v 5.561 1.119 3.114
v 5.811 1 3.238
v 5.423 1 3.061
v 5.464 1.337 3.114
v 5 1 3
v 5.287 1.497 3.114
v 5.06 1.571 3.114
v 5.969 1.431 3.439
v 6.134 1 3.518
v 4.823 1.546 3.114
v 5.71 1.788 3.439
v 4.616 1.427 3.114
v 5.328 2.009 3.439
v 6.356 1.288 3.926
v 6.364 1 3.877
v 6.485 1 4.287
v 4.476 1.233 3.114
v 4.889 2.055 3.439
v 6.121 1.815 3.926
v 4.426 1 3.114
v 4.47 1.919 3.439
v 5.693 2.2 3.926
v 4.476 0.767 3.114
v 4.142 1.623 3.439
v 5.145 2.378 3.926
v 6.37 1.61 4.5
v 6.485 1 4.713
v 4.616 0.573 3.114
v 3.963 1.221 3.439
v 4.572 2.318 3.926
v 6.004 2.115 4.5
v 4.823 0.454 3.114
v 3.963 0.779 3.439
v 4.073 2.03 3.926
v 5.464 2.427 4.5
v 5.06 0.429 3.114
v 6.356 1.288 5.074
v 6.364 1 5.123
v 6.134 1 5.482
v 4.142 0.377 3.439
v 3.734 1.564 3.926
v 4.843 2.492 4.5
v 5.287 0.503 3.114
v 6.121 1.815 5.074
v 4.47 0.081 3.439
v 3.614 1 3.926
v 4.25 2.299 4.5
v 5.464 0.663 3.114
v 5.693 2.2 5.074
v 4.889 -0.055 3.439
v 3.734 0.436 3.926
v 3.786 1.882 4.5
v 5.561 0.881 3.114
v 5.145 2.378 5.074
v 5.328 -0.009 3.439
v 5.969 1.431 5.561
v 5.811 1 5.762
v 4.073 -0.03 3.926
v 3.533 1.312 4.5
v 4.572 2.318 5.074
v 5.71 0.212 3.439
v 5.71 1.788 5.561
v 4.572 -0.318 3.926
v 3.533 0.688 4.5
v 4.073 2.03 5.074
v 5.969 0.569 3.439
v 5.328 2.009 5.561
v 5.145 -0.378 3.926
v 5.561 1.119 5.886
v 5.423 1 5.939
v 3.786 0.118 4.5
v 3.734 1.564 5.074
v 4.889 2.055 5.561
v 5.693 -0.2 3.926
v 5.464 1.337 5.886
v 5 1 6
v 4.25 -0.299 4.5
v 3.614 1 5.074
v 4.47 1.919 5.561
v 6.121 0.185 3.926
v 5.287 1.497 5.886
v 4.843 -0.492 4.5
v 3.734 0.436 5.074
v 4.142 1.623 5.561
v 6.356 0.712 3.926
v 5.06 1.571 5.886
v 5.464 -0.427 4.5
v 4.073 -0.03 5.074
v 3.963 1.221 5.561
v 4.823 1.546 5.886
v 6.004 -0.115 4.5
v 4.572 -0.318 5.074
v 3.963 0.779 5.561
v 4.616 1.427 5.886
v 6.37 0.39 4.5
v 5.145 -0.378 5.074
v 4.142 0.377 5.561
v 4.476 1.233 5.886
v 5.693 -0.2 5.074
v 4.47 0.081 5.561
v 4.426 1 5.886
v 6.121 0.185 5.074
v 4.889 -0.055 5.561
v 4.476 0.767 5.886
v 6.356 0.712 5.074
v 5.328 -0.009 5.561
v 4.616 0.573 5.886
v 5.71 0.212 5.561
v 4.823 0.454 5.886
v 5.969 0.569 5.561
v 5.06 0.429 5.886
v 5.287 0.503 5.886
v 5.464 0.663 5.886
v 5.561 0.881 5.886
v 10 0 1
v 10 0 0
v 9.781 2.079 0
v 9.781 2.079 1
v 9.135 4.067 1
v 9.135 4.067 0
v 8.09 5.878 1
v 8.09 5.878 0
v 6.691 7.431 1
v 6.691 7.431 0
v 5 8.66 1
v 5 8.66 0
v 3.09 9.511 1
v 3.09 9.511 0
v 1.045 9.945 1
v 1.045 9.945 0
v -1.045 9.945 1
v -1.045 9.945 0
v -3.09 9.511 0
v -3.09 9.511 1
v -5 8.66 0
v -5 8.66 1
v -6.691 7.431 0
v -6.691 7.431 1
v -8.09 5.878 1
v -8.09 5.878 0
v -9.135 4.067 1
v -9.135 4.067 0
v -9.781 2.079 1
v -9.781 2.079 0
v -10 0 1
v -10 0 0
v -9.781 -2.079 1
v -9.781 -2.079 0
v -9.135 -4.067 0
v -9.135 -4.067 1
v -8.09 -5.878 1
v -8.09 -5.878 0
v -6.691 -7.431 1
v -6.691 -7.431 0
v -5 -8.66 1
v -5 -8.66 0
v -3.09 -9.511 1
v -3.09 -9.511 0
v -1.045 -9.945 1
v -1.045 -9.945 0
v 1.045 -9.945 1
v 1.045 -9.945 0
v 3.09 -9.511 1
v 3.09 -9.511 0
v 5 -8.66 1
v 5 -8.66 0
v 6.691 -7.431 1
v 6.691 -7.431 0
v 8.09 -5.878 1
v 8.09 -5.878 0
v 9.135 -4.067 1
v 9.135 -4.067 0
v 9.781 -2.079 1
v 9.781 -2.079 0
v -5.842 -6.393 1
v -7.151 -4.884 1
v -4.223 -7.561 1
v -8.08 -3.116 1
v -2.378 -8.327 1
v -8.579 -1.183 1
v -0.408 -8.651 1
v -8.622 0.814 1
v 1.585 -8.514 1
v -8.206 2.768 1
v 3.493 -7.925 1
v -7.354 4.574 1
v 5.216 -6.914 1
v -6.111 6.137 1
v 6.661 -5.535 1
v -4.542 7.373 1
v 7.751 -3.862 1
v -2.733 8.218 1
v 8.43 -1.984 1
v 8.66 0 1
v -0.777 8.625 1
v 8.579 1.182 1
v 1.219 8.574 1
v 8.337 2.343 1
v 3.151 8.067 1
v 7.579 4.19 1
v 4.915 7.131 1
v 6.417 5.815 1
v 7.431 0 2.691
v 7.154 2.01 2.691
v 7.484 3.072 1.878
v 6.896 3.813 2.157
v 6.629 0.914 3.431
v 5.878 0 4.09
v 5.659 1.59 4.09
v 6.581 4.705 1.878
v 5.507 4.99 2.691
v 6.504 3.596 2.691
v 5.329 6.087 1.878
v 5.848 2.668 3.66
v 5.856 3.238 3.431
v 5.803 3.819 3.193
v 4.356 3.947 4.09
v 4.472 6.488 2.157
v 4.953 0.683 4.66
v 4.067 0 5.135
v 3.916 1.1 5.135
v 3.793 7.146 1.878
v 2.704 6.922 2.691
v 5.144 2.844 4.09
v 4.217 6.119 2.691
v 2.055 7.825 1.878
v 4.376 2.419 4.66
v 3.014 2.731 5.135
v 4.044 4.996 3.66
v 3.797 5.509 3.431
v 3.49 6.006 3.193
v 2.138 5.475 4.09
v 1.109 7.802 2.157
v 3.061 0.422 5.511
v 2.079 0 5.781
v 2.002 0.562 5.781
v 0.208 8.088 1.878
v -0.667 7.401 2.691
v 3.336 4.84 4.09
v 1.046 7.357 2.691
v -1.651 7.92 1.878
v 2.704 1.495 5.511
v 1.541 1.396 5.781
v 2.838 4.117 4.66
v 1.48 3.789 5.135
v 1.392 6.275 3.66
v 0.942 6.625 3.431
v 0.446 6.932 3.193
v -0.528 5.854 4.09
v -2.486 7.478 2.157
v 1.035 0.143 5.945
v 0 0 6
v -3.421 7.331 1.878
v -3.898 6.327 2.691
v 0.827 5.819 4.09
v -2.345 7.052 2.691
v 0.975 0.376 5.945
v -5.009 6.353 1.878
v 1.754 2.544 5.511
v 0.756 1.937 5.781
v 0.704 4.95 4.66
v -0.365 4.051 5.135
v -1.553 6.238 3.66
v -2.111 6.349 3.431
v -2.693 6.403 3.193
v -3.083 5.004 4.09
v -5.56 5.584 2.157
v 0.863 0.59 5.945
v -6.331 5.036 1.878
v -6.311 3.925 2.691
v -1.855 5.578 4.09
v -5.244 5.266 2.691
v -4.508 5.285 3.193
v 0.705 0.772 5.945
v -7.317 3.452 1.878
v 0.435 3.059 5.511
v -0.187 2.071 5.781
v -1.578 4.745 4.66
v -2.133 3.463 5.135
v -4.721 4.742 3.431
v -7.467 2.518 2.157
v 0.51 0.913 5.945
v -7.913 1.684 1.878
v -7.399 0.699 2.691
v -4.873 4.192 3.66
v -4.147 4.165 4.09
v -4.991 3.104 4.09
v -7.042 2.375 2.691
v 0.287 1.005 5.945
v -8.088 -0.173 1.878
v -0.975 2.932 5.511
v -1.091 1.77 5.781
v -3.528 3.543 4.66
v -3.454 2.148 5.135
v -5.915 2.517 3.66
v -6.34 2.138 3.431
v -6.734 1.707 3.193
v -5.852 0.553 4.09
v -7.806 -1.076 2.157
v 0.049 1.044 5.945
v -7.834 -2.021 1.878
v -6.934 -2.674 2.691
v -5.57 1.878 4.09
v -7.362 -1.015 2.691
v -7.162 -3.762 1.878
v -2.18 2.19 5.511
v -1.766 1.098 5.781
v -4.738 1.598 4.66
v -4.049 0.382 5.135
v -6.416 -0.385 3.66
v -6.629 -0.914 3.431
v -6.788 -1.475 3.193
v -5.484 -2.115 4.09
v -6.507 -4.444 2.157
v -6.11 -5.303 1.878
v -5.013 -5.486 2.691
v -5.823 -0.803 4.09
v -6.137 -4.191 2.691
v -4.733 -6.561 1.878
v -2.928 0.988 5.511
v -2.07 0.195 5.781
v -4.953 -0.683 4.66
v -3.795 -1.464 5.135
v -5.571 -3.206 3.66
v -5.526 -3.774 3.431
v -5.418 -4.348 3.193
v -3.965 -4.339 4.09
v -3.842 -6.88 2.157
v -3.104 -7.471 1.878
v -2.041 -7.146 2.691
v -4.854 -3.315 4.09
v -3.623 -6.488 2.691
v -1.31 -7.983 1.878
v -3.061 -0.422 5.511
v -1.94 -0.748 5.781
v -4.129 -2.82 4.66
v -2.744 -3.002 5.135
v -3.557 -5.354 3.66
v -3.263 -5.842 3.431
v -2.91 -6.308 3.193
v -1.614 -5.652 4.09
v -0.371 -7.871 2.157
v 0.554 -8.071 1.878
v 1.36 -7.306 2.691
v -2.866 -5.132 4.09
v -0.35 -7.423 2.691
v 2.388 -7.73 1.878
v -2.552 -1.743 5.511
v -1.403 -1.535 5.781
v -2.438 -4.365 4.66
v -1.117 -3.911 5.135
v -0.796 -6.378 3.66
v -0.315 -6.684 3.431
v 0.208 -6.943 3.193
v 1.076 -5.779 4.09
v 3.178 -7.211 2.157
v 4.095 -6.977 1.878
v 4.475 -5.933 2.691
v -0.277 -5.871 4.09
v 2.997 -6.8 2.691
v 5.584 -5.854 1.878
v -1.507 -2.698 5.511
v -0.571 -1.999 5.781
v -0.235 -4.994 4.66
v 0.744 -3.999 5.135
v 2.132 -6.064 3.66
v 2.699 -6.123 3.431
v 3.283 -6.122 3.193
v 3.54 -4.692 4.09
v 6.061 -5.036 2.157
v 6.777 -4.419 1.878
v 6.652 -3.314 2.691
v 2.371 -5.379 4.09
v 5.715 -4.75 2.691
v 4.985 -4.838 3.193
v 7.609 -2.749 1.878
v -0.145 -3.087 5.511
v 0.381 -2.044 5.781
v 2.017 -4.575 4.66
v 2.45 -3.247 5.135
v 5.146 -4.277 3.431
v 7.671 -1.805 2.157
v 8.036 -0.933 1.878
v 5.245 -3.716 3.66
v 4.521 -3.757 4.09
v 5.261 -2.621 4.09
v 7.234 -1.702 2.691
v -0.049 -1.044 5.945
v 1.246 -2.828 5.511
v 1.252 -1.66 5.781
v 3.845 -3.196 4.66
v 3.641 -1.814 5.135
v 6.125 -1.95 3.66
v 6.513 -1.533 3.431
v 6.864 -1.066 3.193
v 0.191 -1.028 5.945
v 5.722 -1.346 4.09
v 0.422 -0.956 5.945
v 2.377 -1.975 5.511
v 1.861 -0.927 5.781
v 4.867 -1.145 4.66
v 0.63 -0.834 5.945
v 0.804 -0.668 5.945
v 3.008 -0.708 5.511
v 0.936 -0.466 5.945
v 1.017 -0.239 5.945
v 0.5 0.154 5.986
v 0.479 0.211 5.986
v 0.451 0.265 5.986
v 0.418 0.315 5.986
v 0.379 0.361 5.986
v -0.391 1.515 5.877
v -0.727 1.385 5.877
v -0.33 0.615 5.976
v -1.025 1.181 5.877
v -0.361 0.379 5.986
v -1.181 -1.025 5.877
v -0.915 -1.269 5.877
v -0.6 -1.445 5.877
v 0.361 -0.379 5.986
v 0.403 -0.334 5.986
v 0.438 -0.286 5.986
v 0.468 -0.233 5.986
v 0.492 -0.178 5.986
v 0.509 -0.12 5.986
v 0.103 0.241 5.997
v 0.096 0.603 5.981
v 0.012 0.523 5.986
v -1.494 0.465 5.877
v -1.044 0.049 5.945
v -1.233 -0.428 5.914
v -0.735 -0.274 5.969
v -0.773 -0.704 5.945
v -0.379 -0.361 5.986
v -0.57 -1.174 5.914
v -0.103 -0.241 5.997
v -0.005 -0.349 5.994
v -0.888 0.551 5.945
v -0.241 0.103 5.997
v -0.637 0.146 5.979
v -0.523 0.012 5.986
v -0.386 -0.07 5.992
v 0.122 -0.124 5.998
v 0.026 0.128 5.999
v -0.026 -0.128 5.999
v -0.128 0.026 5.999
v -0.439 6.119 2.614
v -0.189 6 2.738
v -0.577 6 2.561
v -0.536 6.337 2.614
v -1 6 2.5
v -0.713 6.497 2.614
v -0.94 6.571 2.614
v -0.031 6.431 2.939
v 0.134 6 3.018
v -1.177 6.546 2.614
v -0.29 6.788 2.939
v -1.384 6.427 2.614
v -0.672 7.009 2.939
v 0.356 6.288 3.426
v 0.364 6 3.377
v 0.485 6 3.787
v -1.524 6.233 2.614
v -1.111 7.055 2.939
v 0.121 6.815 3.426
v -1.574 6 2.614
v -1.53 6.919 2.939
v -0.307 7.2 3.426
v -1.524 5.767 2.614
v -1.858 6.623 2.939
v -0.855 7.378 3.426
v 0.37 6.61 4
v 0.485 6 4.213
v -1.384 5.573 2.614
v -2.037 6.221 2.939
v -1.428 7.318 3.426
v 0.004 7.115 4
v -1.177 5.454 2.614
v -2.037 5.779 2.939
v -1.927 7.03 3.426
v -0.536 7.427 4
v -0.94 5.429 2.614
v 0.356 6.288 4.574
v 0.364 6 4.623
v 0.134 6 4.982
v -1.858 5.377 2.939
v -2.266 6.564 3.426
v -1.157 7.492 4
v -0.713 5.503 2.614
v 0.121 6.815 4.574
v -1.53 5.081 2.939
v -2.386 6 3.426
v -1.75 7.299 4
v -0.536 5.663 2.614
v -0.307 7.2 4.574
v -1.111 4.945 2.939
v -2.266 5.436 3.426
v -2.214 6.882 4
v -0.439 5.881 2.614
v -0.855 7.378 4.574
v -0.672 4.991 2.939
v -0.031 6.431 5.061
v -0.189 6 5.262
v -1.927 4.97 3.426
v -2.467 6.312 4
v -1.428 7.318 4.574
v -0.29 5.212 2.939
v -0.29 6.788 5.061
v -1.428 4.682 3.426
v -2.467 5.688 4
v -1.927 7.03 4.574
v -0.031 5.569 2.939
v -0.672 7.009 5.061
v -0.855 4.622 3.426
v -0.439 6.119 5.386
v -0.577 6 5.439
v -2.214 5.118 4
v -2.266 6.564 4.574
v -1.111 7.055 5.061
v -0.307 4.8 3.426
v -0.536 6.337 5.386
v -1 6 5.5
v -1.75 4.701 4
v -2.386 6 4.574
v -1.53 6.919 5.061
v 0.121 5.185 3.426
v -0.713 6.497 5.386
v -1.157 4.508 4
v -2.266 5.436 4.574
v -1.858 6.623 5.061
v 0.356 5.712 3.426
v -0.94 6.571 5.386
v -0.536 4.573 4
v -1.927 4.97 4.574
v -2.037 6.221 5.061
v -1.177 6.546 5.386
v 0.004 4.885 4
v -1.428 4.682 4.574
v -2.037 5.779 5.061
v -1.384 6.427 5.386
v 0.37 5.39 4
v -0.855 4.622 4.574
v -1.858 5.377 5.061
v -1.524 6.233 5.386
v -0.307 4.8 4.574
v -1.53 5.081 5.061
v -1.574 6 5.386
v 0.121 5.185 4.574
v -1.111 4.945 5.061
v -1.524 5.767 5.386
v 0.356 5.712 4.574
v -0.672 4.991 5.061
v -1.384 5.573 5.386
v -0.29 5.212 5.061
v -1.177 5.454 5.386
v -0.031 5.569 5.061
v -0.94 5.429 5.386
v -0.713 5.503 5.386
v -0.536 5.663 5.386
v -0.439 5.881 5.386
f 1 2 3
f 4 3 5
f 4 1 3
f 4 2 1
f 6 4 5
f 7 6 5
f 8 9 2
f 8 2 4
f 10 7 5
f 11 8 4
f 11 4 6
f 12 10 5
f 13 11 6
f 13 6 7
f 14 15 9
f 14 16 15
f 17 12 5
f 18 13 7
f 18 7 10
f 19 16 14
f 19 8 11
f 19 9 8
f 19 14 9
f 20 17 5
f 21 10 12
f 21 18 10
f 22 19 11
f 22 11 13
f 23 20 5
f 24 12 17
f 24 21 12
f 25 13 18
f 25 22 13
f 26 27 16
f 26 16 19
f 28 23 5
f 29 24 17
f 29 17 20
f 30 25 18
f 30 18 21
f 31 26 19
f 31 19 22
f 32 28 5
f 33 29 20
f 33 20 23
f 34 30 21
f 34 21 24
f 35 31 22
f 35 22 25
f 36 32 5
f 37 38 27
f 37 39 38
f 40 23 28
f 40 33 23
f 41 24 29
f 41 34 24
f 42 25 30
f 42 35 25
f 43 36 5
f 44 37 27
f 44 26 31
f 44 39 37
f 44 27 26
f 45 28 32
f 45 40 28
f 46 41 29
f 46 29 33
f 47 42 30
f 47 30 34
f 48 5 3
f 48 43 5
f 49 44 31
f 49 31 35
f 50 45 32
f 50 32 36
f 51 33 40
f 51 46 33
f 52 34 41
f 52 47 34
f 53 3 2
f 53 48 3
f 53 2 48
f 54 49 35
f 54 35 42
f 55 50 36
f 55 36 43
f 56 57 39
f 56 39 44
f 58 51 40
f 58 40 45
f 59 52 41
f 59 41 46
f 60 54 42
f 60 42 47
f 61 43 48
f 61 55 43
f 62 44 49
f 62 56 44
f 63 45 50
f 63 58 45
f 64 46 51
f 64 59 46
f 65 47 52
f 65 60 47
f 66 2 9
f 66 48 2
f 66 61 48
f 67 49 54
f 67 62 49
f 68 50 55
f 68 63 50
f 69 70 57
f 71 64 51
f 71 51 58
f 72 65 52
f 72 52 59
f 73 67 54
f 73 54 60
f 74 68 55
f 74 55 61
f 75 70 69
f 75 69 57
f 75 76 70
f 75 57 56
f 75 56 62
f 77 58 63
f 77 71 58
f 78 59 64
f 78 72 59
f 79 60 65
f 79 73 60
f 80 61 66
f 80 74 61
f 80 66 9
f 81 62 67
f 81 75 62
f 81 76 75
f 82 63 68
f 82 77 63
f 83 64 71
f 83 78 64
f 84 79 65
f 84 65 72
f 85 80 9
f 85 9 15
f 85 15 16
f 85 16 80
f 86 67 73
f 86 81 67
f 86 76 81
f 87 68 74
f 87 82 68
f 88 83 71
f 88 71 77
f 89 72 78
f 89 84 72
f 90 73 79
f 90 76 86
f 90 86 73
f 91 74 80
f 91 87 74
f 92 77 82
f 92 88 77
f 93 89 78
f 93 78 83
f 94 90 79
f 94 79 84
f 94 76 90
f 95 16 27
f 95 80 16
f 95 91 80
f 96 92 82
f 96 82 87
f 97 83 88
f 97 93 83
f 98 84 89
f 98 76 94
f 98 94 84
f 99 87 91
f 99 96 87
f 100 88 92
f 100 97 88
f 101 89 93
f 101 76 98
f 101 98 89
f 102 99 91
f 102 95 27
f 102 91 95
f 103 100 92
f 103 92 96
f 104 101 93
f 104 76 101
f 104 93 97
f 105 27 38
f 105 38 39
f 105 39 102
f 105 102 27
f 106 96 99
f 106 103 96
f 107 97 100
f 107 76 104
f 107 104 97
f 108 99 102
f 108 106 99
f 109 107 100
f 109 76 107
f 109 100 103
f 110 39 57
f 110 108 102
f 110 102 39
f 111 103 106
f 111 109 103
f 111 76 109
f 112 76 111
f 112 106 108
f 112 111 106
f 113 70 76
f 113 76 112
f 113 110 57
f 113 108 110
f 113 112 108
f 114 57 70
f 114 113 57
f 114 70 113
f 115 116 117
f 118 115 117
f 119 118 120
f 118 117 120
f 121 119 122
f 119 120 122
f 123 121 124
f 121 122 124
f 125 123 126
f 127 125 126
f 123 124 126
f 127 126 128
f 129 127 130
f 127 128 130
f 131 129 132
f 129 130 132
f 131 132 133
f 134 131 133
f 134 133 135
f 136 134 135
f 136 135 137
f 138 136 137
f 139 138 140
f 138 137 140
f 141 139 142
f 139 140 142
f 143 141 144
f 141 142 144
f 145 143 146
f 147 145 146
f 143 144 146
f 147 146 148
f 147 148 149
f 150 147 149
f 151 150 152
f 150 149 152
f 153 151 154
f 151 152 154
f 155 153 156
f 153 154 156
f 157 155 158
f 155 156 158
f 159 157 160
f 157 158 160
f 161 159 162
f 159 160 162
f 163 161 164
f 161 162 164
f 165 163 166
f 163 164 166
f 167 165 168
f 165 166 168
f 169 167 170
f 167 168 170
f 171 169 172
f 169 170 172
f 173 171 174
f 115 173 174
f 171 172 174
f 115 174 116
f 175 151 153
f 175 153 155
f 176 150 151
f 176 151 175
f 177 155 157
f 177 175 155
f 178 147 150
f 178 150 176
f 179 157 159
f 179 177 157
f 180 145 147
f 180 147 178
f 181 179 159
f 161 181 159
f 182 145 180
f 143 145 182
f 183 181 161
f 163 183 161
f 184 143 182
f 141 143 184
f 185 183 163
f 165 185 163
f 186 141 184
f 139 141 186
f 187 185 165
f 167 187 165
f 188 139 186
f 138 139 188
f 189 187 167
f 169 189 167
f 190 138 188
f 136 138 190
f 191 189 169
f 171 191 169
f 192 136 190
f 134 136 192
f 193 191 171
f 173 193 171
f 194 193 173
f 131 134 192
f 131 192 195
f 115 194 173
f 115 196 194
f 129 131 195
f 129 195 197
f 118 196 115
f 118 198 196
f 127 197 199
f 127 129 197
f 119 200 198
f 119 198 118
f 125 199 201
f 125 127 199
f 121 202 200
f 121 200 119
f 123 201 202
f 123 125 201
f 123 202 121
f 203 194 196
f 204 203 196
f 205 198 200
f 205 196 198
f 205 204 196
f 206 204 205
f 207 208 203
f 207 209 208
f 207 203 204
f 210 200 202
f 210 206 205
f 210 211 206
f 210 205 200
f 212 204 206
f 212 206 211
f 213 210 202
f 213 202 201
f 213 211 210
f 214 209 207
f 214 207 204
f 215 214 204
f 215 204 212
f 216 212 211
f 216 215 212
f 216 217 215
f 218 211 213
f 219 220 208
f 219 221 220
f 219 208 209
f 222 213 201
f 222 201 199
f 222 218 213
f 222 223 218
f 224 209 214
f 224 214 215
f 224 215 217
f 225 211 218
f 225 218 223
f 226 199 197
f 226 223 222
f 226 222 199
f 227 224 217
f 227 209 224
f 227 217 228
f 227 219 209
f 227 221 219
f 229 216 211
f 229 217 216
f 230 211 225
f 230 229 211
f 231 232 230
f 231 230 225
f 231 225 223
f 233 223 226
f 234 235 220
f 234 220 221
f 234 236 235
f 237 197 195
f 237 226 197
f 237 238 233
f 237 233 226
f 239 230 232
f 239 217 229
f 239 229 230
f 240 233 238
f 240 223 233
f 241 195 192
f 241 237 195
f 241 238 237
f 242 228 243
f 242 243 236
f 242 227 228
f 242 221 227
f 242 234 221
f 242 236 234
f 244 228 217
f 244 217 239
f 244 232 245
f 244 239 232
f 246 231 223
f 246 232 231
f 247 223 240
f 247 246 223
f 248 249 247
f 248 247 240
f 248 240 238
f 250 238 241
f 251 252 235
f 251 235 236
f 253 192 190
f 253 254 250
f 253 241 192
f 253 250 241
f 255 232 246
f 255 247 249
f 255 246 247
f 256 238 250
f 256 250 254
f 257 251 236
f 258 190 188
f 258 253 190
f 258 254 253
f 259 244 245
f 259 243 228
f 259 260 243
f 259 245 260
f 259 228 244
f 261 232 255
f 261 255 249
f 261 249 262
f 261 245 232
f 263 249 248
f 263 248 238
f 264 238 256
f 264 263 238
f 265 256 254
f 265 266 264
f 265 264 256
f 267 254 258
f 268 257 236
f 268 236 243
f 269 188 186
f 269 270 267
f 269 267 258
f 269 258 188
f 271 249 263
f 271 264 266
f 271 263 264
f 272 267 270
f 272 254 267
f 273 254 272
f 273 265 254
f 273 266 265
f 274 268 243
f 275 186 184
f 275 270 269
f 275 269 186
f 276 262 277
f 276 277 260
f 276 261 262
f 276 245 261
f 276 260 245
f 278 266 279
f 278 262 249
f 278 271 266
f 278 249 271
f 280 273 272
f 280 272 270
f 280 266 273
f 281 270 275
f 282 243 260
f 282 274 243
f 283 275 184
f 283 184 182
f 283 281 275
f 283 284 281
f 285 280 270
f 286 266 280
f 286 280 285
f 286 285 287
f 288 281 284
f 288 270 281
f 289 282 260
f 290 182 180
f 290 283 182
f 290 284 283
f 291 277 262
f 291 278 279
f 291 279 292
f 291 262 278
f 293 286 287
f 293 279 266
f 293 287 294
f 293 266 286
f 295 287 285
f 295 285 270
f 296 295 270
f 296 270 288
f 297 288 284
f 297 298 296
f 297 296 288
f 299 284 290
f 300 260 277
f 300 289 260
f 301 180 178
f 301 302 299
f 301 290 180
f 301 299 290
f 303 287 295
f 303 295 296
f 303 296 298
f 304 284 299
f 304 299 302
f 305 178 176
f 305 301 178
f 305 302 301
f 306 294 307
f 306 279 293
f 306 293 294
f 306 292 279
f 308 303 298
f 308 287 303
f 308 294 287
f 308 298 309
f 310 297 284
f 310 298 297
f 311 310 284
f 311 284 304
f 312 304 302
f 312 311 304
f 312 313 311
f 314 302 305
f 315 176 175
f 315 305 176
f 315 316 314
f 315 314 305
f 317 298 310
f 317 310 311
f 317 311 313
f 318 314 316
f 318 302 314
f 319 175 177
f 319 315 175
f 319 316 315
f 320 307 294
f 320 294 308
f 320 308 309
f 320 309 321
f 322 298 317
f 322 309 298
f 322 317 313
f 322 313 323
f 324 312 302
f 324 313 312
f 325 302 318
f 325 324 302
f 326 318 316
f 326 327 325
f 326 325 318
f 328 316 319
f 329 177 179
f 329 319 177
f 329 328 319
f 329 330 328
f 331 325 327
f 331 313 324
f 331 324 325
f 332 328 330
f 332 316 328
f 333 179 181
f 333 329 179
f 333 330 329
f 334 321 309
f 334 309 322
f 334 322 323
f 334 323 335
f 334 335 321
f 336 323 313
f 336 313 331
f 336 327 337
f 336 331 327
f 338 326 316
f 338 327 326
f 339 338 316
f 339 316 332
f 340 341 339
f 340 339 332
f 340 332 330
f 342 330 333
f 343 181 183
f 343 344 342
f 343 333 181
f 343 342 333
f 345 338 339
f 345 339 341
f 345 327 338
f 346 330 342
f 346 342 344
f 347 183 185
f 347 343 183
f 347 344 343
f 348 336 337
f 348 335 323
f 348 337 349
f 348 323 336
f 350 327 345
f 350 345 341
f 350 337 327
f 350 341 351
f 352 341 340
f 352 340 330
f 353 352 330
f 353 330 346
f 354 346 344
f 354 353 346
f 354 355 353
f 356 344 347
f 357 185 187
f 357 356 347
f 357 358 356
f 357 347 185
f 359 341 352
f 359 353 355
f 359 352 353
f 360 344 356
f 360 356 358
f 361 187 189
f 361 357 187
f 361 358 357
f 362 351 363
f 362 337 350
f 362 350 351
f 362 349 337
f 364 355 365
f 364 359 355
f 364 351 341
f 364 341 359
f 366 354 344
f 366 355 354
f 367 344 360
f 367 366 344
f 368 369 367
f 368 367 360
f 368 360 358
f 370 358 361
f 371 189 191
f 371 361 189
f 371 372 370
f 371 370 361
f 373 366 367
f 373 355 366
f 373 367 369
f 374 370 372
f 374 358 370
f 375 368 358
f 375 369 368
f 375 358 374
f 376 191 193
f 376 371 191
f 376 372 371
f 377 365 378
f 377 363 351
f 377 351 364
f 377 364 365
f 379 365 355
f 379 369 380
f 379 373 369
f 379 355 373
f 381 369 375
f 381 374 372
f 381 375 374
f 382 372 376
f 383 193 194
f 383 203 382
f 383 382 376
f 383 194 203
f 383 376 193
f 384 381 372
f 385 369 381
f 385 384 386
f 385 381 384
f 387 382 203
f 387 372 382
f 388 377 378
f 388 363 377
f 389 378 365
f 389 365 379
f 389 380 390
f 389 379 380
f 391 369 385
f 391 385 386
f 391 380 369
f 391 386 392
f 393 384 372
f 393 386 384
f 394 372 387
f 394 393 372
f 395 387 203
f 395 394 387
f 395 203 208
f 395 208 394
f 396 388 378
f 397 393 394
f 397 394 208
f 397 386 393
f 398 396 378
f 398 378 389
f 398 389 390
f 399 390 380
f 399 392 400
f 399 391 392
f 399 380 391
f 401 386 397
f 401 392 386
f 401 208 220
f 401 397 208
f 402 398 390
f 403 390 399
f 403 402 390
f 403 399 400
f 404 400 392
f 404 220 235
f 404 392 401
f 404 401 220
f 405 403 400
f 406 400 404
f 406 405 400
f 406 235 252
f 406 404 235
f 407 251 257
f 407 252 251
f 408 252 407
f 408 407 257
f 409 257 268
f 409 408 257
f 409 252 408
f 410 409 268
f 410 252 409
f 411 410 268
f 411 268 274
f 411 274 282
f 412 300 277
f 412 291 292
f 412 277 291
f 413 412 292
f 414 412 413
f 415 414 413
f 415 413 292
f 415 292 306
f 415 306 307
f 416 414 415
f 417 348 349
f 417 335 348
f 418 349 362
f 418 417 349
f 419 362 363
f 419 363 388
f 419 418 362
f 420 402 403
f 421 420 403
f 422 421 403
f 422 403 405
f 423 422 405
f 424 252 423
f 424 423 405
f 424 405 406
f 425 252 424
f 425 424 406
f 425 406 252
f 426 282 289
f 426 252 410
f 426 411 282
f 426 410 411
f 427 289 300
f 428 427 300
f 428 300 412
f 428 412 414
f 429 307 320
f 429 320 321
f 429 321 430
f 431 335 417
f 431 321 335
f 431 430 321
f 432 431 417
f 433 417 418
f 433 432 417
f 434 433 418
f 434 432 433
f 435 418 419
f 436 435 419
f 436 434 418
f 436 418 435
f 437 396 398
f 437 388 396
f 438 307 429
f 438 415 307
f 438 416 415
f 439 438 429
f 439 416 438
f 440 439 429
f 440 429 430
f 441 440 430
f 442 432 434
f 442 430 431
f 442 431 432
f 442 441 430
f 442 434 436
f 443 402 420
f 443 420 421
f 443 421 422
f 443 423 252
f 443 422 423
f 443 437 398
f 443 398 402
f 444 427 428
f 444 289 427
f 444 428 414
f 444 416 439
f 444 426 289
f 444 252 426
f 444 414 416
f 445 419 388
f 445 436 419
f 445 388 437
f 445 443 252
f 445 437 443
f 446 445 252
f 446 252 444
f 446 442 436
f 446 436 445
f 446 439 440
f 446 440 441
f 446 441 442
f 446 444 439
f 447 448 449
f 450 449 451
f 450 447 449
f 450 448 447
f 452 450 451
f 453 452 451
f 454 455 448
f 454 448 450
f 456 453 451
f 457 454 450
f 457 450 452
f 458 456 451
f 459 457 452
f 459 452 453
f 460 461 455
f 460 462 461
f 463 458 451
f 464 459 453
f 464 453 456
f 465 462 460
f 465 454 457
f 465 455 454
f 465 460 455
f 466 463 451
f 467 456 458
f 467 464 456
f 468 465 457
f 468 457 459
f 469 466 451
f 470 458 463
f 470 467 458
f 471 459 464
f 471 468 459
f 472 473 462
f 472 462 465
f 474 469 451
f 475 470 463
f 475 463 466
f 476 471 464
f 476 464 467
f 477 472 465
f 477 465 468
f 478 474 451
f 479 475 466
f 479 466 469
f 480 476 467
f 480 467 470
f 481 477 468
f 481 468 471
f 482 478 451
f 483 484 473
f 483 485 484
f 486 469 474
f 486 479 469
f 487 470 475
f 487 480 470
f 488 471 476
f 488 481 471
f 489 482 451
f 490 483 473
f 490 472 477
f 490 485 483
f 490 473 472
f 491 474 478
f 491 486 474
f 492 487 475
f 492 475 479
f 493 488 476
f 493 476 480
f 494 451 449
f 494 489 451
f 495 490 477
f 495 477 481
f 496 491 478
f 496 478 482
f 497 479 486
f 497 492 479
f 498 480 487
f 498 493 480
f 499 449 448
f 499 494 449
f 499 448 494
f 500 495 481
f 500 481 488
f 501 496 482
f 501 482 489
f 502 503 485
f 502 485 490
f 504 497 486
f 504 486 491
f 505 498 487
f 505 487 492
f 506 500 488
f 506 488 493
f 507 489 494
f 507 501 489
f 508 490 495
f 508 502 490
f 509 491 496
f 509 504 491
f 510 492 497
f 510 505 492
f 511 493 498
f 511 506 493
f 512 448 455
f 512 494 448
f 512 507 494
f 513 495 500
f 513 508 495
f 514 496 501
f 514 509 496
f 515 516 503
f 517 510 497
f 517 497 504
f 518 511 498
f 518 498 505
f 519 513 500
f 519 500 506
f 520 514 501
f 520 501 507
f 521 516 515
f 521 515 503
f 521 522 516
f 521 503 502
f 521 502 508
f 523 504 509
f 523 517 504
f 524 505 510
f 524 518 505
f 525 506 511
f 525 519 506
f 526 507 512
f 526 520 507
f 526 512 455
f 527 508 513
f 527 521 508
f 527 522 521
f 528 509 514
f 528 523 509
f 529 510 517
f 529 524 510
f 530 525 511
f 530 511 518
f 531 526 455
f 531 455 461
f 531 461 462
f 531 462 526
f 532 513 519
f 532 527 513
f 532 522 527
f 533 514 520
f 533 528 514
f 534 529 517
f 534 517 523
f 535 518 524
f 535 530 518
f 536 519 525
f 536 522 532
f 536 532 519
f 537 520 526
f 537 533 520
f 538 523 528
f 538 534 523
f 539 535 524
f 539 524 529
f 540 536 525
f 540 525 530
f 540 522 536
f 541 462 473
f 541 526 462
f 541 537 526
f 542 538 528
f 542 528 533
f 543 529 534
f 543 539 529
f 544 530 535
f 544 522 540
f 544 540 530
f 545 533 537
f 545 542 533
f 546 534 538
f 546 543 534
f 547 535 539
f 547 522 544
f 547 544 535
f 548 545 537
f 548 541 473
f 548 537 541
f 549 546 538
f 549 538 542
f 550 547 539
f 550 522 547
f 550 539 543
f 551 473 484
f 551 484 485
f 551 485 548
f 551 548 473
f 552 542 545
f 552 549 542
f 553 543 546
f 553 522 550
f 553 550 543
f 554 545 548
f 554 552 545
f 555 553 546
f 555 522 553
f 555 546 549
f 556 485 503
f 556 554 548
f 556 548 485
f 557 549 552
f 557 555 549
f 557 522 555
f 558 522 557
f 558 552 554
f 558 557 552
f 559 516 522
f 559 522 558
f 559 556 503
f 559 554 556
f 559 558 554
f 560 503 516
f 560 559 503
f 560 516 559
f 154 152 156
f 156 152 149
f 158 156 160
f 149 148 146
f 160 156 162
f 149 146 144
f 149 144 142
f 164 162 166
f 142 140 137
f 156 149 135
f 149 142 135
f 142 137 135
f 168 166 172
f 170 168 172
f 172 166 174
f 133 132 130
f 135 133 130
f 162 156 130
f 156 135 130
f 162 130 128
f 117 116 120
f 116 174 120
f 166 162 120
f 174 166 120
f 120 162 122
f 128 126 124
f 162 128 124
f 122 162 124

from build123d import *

# Parameters (mm, degrees)
CYLINDER_R     = 10
CYLINDER_DEPTH = 1


with BuildPart() as cylinder:
    # Cylinder → Cylinder (new body)
    with BuildSketch(Plane.XY):
        Circle(CYLINDER_R)
    extrude(amount=CYLINDER_DEPTH)


with BuildPart() as fusion:
    # Sphere → Sphere (revolve)
    with BuildSketch(Plane(origin=(0, 0, -4), x_dir=(1, 0, 0), z_dir=(0, -1, 0))):
        with BuildLine():
            ThreePointArc((9.063078, 4.226183), (5.372996, 8.433914), (0, 10))
            Line((0, 10), (0, 4.226183))
            Line((0, 4.226183), (9.063078, 4.226183))
        make_face()
    revolve(axis=Axis((0, 0, -4), (0, 0, 1)))

    # Fusion: union Cylinder
    add(cylinder.part)


with BuildPart() as sphere001:
    # Sphere001 → Sphere001 (revolve)
    with BuildSketch(Plane(origin=(5, 1, 4.5), x_dir=(1, 0, 0), z_dir=(0, -1, 0))):
        with BuildLine():
            ThreePointArc((0, -1.5), (1.5, 0), (0, 1.5))
            Line((0, 1.5), (0, -1.5))
        make_face()
    revolve(axis=Axis((5, 1, 4.5), (0, 0, 1)))


with BuildPart() as fusion001:
    # Sphere002 → Sphere002 (revolve)
    with BuildSketch(Plane(origin=(-1, 6, 4), x_dir=(1, 0, 0), z_dir=(0, -1, 0))):
        with BuildLine():
            ThreePointArc((0, -1.5), (1.5, 0), (0, 1.5))
            Line((0, 1.5), (0, -1.5))
        make_face()
    revolve(axis=Axis((-1, 6, 4), (0, 0, 1)))

    # Fusion001: union Sphere001
    add(sphere001.part)


solid = Compound([fusion.part, fusion001.part])
